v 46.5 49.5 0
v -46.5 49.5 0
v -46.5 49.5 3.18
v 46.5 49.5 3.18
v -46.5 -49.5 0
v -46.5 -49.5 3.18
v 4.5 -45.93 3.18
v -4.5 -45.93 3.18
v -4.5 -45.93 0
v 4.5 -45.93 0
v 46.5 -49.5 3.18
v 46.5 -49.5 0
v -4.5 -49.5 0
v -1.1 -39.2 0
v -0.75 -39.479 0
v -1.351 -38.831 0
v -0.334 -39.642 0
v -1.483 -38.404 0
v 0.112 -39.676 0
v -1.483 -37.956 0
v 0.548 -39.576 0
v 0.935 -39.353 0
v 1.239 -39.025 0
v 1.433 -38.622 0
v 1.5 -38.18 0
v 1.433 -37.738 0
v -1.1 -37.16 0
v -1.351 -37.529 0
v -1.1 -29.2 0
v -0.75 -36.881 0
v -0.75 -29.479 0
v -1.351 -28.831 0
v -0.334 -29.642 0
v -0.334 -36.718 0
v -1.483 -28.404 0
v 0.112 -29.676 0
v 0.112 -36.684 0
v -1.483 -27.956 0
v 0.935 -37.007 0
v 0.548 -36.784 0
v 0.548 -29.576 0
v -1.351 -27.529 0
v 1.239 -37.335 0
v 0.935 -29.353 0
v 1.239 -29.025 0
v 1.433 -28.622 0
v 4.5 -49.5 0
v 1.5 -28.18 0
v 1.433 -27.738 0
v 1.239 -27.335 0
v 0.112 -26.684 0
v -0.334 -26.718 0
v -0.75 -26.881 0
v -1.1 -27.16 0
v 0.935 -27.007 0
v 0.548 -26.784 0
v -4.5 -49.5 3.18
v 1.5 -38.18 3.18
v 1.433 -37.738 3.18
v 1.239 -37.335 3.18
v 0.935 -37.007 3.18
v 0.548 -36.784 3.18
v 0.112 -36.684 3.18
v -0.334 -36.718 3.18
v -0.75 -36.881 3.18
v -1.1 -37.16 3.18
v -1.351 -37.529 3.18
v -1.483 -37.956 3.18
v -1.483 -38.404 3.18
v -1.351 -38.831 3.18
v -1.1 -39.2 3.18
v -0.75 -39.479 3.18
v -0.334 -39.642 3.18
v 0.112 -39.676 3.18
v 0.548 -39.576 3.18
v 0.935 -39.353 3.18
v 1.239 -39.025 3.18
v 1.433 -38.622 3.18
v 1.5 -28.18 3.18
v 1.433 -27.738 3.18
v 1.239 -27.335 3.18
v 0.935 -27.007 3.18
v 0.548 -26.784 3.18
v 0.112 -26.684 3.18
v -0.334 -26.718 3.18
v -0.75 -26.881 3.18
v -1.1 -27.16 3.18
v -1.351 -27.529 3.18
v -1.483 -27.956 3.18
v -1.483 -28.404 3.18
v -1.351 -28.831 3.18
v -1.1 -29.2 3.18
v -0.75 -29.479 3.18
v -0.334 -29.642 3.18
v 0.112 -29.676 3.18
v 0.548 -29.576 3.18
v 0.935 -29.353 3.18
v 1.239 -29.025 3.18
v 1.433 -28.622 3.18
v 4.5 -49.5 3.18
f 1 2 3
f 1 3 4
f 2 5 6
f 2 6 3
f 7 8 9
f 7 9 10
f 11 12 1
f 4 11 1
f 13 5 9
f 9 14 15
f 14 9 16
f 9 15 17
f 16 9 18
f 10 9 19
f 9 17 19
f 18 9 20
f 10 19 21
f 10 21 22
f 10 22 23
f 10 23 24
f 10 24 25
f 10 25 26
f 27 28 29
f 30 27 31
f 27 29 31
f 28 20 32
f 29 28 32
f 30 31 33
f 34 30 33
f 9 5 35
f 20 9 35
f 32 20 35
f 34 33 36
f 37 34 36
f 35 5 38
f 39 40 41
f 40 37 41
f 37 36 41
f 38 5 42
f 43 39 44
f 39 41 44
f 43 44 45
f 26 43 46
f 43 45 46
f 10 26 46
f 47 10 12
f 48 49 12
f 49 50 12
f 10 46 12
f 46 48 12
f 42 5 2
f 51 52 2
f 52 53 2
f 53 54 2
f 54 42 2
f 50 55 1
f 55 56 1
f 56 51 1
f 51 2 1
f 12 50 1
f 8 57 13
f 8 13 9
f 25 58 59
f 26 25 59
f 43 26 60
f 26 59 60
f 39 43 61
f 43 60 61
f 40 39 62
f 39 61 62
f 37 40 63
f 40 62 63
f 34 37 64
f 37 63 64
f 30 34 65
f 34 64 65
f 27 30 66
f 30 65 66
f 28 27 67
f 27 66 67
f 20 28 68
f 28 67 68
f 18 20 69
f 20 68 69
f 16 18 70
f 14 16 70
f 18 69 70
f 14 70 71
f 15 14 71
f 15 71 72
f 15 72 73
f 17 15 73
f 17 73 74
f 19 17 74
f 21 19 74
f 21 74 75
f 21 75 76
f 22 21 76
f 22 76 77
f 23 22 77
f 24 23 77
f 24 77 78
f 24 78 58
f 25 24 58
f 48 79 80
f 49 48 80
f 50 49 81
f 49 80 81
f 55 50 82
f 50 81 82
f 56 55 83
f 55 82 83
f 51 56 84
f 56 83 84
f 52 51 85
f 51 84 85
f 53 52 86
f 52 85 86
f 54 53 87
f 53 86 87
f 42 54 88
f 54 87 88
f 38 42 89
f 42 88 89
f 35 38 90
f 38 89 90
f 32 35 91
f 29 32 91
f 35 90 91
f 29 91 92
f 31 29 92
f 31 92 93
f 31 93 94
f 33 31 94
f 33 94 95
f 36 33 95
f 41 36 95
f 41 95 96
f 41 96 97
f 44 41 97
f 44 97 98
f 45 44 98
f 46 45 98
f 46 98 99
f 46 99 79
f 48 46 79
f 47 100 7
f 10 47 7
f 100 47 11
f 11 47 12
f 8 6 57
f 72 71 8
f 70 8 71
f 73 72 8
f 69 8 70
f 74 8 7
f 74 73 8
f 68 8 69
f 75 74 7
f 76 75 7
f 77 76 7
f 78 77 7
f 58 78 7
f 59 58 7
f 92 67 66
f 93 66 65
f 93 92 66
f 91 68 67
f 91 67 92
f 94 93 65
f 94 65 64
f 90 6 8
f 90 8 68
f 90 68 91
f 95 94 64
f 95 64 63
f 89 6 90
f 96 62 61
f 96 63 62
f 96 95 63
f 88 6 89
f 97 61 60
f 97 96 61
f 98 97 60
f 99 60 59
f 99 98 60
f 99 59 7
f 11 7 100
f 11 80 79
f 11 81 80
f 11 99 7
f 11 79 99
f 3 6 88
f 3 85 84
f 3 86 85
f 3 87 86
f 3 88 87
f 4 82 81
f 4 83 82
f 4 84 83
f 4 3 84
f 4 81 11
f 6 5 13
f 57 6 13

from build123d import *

# Parameters (mm, degrees)
SKETCH1_W           = 93
SKETCH1_H           = 99
BOSS_EXTRUDE1_DEPTH = 3.18
SKETCH2_R           = 1.5
CUT_EXTRUDE1_DEPTH  = 10
SKETCH3_W           = 9
SKETCH3_H           = 3.57
CUT_EXTRUDE2_DEPTH  = 10


with BuildPart() as part:
    # Sketch1 → Boss-Extrude1 (new body)
    with BuildSketch(Plane.XY):
        Rectangle(SKETCH1_W, SKETCH1_H)
    extrude(amount=BOSS_EXTRUDE1_DEPTH)

    # Sketch2 → Cut-Extrude1 (cut)
    with BuildSketch(Plane.XY.offset(3.18)):
        with Locations((0, -38.18)):
            Circle(SKETCH2_R)
        with Locations((0, -28.18)):
            Circle(SKETCH2_R)
    extrude(amount=-CUT_EXTRUDE1_DEPTH, mode=Mode.SUBTRACT)

    # Sketch3 → Cut-Extrude2 (cut)
    with BuildSketch(Plane.XY.offset(3.18)):
        with Locations((0, -47.715)):
            Rectangle(SKETCH3_W, SKETCH3_H)
    extrude(amount=-CUT_EXTRUDE2_DEPTH, mode=Mode.SUBTRACT)


solid = part.part
